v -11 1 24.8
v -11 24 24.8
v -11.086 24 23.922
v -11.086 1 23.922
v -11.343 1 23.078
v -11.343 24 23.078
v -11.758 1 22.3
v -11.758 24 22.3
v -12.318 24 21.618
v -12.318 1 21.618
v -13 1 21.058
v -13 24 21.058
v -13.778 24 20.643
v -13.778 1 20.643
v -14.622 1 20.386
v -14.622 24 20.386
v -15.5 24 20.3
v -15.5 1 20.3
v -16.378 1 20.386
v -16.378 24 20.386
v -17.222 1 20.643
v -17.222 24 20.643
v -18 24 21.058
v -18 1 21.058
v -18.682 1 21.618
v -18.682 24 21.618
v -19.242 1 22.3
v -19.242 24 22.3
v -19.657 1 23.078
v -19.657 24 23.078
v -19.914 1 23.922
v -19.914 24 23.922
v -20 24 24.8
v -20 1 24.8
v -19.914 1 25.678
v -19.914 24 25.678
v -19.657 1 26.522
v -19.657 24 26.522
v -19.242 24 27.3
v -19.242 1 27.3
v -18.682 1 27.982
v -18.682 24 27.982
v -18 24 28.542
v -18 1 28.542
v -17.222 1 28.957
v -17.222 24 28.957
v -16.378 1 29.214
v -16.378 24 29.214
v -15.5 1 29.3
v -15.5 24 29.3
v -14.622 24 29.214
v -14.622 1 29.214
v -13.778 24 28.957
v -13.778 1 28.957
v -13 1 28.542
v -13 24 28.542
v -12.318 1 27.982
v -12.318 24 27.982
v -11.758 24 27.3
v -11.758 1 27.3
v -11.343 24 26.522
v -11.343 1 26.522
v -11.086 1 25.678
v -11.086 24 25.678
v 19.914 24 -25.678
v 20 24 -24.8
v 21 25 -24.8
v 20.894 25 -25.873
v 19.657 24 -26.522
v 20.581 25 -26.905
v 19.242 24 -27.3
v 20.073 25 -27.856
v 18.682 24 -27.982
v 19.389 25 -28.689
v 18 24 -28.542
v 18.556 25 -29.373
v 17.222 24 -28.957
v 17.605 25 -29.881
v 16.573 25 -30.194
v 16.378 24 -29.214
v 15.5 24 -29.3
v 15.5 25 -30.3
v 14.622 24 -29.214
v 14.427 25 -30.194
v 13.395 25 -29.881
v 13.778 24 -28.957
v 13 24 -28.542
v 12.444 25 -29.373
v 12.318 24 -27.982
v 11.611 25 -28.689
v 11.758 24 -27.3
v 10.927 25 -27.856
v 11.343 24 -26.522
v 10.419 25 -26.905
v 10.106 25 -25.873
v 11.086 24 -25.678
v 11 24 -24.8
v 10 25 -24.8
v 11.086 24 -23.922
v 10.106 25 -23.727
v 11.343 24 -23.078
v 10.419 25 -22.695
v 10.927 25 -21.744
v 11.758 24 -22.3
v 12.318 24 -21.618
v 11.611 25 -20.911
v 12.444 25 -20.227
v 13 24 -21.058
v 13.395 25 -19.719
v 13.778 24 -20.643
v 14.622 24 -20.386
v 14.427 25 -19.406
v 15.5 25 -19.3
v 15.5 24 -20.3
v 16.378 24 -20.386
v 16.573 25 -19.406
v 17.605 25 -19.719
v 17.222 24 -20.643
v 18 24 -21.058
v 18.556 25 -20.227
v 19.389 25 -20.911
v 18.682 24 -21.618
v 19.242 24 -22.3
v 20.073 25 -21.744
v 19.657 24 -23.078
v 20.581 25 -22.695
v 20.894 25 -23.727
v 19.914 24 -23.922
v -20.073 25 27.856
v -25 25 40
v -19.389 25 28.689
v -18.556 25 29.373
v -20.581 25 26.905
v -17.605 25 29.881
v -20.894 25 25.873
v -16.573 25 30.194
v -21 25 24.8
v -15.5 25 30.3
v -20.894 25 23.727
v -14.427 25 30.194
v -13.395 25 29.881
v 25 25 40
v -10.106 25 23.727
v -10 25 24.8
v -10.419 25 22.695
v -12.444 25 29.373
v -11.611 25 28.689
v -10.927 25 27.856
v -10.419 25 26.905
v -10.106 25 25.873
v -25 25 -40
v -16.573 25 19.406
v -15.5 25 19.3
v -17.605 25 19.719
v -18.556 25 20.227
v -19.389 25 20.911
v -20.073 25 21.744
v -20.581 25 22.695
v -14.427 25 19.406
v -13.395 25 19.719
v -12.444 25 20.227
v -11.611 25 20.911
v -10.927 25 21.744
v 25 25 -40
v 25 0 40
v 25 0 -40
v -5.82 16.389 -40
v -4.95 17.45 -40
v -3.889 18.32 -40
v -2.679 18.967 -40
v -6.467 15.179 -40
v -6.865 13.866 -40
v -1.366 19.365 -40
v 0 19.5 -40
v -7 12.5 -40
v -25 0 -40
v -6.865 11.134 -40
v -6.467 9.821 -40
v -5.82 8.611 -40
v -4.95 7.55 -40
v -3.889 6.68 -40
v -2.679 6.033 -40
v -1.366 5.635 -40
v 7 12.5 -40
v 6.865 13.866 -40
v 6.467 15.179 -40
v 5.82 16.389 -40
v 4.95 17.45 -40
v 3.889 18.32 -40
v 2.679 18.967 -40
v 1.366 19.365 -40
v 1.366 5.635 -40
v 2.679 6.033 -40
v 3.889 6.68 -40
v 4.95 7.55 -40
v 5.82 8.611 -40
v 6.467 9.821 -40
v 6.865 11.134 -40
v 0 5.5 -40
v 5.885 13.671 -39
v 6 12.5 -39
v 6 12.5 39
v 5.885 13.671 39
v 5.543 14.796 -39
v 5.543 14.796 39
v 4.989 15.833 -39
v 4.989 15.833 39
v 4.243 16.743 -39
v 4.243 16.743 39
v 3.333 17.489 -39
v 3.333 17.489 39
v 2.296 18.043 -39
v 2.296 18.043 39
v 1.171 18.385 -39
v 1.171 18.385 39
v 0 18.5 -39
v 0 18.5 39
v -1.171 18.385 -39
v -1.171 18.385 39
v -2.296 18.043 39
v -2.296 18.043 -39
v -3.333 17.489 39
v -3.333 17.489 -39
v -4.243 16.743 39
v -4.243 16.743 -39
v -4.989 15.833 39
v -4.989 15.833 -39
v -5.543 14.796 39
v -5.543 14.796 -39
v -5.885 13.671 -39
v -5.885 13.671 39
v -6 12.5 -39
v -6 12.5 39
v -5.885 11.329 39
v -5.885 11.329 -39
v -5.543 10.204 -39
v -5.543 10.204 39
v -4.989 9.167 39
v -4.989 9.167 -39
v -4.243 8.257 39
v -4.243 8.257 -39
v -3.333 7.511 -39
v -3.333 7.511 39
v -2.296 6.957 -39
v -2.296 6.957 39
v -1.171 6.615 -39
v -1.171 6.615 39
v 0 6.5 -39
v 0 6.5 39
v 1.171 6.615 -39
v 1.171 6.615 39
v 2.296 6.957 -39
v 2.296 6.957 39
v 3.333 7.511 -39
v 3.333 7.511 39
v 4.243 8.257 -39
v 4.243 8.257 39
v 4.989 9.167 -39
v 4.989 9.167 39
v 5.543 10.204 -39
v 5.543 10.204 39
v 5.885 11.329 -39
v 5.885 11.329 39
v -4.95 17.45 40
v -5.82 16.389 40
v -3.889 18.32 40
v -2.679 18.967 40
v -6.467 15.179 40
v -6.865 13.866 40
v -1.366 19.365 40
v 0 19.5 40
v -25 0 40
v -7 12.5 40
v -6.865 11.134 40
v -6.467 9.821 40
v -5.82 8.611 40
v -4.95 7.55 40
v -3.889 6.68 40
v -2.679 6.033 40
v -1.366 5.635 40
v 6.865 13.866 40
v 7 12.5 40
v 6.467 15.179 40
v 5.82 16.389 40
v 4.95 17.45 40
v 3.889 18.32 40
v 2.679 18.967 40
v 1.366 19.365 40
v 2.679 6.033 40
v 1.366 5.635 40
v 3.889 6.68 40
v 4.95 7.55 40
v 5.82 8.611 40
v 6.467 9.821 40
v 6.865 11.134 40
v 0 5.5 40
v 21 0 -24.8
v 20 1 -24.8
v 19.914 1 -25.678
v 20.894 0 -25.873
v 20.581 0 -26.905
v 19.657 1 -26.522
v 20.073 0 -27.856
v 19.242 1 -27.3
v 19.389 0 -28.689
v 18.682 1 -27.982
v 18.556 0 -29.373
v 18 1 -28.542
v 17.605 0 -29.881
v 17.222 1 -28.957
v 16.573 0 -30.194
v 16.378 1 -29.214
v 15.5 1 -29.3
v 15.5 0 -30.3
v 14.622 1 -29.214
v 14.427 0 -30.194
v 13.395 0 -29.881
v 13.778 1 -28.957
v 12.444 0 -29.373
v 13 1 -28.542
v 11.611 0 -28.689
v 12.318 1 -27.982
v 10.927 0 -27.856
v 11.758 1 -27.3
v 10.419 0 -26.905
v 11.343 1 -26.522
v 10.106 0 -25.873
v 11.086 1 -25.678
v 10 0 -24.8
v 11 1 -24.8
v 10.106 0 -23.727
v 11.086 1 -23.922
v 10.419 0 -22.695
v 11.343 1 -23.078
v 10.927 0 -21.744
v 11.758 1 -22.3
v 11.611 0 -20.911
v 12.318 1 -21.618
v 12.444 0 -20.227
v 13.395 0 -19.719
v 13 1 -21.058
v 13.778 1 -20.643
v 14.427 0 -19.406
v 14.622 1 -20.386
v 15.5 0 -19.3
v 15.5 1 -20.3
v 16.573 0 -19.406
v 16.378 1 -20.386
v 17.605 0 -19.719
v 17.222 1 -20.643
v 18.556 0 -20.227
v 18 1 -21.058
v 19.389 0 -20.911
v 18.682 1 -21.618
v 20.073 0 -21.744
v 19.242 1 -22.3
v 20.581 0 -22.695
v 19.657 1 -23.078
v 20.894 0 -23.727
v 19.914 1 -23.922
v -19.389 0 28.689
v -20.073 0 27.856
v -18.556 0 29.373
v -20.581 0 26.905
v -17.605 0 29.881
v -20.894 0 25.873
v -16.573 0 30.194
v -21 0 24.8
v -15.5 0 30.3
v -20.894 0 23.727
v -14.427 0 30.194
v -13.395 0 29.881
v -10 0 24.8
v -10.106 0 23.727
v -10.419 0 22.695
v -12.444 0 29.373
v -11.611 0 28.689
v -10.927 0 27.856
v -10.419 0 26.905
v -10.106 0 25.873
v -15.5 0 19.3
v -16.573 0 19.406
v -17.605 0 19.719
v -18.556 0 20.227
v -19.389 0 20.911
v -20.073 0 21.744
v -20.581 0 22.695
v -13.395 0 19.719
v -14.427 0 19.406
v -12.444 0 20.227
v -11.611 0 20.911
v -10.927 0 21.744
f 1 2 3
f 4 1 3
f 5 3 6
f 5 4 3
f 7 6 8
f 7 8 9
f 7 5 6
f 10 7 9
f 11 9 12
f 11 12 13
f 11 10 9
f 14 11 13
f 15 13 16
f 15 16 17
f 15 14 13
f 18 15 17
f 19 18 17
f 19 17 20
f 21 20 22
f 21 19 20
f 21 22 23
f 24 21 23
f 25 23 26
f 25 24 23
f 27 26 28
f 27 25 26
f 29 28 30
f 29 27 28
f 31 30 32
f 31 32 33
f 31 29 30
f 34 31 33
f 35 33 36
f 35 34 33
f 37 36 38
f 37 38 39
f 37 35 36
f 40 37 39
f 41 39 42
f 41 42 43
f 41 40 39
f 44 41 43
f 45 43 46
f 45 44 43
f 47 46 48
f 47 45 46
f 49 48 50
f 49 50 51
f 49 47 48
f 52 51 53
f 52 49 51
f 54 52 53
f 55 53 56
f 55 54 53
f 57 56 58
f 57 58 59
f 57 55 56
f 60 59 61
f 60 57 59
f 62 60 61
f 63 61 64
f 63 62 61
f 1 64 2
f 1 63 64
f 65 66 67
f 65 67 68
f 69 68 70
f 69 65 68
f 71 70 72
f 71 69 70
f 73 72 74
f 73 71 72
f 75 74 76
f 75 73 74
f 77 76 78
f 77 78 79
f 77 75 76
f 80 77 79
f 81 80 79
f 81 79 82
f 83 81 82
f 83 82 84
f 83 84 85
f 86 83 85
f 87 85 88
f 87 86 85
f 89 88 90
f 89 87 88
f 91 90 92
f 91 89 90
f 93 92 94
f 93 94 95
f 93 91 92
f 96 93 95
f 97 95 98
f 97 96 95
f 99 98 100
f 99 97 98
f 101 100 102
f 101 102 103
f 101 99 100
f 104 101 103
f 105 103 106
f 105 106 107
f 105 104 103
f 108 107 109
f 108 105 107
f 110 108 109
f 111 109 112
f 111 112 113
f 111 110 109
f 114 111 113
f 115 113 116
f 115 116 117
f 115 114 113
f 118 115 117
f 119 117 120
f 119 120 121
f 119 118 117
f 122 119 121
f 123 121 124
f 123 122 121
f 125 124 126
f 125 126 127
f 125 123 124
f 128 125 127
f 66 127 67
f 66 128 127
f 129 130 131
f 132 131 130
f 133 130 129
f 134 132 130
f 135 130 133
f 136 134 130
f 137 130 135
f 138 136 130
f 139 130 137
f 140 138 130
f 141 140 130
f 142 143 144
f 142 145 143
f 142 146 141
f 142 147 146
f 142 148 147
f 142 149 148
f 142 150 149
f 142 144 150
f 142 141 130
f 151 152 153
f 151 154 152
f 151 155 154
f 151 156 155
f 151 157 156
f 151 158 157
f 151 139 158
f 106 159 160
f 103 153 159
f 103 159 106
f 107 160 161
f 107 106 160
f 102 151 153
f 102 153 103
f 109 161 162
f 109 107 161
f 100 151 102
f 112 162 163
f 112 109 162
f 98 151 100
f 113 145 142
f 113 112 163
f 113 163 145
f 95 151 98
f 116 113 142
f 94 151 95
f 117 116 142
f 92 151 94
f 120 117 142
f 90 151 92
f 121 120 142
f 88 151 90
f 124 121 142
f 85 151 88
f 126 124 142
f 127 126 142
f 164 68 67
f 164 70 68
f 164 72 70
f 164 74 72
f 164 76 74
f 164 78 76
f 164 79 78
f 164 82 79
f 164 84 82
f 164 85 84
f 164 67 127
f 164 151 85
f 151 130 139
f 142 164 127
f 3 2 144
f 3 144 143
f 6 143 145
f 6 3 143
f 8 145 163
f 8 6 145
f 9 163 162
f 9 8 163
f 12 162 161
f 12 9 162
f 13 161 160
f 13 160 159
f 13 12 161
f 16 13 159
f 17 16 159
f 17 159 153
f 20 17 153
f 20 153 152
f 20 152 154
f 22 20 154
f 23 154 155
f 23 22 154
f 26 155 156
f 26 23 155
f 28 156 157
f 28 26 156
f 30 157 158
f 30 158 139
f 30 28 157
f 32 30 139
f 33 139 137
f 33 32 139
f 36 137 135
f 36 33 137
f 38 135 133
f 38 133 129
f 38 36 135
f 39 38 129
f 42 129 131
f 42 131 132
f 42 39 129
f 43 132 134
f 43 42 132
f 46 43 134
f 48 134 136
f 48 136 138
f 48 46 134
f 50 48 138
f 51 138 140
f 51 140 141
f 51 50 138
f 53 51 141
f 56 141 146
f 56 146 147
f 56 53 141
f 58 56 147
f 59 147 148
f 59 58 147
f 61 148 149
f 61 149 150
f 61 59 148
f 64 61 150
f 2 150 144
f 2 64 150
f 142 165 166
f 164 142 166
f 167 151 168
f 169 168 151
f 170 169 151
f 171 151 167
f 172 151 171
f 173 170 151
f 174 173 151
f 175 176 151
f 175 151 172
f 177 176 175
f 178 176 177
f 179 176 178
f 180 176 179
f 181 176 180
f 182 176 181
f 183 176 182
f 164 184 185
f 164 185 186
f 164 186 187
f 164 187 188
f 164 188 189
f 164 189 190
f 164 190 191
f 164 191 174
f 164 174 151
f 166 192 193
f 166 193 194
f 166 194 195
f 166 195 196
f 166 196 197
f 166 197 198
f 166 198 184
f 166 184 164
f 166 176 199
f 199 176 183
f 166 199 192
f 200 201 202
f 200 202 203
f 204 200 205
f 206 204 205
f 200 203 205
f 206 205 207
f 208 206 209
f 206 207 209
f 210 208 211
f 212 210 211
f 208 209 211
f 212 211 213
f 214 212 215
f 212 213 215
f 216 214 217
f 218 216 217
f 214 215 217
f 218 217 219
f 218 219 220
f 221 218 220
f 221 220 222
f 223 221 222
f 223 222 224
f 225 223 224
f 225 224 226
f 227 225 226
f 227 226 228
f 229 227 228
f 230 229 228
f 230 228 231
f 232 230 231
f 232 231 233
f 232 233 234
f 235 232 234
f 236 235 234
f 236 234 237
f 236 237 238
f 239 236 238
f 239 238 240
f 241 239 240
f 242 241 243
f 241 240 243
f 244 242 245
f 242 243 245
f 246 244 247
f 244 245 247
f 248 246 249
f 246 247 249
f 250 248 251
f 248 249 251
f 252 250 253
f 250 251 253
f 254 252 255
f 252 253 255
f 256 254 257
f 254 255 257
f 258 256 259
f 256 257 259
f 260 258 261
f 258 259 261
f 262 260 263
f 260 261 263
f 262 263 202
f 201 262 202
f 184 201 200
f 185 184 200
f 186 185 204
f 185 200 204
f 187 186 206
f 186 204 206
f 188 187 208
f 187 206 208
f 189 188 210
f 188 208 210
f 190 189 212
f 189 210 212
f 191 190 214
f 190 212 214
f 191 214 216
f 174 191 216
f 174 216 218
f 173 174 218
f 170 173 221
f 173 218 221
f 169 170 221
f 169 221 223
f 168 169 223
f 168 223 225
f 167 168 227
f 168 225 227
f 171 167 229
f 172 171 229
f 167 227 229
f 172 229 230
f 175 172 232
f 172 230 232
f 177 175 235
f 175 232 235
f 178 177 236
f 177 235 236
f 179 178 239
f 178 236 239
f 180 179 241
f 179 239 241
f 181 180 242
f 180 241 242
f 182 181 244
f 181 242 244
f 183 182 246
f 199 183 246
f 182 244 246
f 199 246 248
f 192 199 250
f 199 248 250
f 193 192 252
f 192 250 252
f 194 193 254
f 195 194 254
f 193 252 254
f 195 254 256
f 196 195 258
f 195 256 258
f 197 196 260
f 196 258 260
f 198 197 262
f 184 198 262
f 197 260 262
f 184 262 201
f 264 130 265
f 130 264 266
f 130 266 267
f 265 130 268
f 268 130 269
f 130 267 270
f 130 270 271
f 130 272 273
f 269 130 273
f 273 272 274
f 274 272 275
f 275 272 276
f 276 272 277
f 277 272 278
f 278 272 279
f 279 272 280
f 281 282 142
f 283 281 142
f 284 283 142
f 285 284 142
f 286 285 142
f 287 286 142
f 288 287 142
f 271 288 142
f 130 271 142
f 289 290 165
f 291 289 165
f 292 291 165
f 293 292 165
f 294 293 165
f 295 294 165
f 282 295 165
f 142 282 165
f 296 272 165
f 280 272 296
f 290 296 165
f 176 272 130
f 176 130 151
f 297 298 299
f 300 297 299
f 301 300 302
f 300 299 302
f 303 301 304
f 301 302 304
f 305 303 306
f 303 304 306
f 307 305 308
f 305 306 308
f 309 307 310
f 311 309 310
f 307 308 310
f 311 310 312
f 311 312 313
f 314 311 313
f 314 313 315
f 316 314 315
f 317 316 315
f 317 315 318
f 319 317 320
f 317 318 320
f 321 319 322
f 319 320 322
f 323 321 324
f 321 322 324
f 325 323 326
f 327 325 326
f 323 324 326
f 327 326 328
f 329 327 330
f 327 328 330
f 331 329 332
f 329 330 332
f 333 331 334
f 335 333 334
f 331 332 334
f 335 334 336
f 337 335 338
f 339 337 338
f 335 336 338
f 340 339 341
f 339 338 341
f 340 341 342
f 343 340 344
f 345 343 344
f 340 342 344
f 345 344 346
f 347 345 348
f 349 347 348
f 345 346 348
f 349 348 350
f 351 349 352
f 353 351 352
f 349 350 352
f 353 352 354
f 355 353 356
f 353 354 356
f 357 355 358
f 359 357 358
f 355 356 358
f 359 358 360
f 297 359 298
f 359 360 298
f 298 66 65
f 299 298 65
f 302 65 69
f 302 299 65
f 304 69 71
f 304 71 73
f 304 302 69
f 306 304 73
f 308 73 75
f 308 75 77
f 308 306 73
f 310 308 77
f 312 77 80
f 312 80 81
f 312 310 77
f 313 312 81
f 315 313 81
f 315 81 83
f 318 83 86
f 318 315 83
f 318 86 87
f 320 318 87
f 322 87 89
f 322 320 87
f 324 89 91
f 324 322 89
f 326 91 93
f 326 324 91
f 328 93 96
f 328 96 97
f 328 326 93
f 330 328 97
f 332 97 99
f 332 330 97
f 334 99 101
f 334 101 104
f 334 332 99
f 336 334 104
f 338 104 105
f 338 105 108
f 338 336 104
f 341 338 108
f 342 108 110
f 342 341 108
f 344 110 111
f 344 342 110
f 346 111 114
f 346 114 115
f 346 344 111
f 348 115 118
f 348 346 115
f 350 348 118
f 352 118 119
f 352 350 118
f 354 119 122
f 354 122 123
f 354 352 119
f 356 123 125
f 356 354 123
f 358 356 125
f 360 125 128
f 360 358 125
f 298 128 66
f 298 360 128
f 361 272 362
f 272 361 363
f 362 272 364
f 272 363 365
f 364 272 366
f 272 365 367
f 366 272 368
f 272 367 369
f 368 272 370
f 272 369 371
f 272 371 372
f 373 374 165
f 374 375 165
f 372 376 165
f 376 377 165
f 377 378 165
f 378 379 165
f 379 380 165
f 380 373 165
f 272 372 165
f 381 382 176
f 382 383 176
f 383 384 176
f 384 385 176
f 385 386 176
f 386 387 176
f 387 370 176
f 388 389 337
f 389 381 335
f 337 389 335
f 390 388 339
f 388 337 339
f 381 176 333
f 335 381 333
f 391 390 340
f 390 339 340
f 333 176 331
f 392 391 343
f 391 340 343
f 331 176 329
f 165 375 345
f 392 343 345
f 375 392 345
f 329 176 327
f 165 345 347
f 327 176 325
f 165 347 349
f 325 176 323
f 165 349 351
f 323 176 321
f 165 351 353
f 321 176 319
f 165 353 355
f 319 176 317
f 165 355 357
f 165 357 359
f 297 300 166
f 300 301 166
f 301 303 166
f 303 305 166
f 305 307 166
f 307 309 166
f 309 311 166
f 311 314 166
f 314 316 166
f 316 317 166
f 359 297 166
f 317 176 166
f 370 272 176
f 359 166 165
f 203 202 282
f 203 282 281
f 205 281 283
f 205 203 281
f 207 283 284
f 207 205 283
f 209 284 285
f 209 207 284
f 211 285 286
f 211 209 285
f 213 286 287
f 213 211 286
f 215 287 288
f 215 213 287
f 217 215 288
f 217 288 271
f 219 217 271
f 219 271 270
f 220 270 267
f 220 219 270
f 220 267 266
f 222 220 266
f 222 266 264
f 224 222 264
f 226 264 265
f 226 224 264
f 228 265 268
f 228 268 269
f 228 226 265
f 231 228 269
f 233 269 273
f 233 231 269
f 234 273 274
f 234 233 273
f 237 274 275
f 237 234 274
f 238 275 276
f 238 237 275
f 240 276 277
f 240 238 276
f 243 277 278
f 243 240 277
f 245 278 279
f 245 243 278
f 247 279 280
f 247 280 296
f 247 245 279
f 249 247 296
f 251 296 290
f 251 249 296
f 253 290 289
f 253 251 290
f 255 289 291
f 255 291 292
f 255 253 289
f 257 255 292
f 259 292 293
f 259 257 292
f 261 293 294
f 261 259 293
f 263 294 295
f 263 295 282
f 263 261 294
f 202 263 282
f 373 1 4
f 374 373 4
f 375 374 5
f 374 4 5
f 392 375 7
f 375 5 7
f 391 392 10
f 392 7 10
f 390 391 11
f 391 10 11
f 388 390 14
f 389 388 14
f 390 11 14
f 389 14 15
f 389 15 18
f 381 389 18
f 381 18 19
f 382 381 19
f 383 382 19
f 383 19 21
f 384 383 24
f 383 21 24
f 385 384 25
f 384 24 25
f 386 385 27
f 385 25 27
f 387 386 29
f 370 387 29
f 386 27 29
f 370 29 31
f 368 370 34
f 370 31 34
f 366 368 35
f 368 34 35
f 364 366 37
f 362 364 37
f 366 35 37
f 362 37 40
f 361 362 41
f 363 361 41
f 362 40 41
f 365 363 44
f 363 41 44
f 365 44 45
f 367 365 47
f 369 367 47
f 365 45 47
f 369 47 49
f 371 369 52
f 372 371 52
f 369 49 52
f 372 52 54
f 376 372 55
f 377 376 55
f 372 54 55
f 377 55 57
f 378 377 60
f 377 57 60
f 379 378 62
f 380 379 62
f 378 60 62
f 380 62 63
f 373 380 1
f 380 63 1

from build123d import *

# Parameters (mm, degrees)
SKETCH1_W           = 50
SKETCH1_H           = 80
SKETCH1_R           = 4.5
BOSS_EXTRUDE1_DEPTH = 25
SKETCH2_R           = 6
CUT_EXTRUDE1_DEPTH  = 81
CHAMFER1_SIZE       = 1


with BuildPart() as part:
    # Sketch1 → Boss-Extrude1 (new body)
    with BuildSketch(Plane(origin=(0, 0, 0), x_dir=(1, 0, 0), z_dir=(0, 1, 0))):
        Rectangle(SKETCH1_W, SKETCH1_H)
        with Locations((15.5, 24.8)):
            Circle(SKETCH1_R, mode=Mode.SUBTRACT)
        with Locations((-15.5, -24.8)):
            Circle(SKETCH1_R, mode=Mode.SUBTRACT)
    extrude(amount=BOSS_EXTRUDE1_DEPTH)

    # Sketch2 → Cut-Extrude1 (cut, through all)
    with BuildSketch(Plane.XY.offset(40)):
        with Locations((0, 12.5)):
            Circle(SKETCH2_R)
    extrude(amount=-CUT_EXTRUDE1_DEPTH, mode=Mode.SUBTRACT)

    # Chamfer1
    chamfer1_edges = [part.edges().sort_by_distance(p)[0] for p in [
        (11, 0, -24.8),
        (11, 25, -24.8),
        (-20, 0, 24.8),
        (-20, 25, 24.8),
        (-6, 12.5, -40),
        (-6, 12.5, 40),
    ]]
    chamfer(chamfer1_edges, length=CHAMFER1_SIZE)


solid = part.part
